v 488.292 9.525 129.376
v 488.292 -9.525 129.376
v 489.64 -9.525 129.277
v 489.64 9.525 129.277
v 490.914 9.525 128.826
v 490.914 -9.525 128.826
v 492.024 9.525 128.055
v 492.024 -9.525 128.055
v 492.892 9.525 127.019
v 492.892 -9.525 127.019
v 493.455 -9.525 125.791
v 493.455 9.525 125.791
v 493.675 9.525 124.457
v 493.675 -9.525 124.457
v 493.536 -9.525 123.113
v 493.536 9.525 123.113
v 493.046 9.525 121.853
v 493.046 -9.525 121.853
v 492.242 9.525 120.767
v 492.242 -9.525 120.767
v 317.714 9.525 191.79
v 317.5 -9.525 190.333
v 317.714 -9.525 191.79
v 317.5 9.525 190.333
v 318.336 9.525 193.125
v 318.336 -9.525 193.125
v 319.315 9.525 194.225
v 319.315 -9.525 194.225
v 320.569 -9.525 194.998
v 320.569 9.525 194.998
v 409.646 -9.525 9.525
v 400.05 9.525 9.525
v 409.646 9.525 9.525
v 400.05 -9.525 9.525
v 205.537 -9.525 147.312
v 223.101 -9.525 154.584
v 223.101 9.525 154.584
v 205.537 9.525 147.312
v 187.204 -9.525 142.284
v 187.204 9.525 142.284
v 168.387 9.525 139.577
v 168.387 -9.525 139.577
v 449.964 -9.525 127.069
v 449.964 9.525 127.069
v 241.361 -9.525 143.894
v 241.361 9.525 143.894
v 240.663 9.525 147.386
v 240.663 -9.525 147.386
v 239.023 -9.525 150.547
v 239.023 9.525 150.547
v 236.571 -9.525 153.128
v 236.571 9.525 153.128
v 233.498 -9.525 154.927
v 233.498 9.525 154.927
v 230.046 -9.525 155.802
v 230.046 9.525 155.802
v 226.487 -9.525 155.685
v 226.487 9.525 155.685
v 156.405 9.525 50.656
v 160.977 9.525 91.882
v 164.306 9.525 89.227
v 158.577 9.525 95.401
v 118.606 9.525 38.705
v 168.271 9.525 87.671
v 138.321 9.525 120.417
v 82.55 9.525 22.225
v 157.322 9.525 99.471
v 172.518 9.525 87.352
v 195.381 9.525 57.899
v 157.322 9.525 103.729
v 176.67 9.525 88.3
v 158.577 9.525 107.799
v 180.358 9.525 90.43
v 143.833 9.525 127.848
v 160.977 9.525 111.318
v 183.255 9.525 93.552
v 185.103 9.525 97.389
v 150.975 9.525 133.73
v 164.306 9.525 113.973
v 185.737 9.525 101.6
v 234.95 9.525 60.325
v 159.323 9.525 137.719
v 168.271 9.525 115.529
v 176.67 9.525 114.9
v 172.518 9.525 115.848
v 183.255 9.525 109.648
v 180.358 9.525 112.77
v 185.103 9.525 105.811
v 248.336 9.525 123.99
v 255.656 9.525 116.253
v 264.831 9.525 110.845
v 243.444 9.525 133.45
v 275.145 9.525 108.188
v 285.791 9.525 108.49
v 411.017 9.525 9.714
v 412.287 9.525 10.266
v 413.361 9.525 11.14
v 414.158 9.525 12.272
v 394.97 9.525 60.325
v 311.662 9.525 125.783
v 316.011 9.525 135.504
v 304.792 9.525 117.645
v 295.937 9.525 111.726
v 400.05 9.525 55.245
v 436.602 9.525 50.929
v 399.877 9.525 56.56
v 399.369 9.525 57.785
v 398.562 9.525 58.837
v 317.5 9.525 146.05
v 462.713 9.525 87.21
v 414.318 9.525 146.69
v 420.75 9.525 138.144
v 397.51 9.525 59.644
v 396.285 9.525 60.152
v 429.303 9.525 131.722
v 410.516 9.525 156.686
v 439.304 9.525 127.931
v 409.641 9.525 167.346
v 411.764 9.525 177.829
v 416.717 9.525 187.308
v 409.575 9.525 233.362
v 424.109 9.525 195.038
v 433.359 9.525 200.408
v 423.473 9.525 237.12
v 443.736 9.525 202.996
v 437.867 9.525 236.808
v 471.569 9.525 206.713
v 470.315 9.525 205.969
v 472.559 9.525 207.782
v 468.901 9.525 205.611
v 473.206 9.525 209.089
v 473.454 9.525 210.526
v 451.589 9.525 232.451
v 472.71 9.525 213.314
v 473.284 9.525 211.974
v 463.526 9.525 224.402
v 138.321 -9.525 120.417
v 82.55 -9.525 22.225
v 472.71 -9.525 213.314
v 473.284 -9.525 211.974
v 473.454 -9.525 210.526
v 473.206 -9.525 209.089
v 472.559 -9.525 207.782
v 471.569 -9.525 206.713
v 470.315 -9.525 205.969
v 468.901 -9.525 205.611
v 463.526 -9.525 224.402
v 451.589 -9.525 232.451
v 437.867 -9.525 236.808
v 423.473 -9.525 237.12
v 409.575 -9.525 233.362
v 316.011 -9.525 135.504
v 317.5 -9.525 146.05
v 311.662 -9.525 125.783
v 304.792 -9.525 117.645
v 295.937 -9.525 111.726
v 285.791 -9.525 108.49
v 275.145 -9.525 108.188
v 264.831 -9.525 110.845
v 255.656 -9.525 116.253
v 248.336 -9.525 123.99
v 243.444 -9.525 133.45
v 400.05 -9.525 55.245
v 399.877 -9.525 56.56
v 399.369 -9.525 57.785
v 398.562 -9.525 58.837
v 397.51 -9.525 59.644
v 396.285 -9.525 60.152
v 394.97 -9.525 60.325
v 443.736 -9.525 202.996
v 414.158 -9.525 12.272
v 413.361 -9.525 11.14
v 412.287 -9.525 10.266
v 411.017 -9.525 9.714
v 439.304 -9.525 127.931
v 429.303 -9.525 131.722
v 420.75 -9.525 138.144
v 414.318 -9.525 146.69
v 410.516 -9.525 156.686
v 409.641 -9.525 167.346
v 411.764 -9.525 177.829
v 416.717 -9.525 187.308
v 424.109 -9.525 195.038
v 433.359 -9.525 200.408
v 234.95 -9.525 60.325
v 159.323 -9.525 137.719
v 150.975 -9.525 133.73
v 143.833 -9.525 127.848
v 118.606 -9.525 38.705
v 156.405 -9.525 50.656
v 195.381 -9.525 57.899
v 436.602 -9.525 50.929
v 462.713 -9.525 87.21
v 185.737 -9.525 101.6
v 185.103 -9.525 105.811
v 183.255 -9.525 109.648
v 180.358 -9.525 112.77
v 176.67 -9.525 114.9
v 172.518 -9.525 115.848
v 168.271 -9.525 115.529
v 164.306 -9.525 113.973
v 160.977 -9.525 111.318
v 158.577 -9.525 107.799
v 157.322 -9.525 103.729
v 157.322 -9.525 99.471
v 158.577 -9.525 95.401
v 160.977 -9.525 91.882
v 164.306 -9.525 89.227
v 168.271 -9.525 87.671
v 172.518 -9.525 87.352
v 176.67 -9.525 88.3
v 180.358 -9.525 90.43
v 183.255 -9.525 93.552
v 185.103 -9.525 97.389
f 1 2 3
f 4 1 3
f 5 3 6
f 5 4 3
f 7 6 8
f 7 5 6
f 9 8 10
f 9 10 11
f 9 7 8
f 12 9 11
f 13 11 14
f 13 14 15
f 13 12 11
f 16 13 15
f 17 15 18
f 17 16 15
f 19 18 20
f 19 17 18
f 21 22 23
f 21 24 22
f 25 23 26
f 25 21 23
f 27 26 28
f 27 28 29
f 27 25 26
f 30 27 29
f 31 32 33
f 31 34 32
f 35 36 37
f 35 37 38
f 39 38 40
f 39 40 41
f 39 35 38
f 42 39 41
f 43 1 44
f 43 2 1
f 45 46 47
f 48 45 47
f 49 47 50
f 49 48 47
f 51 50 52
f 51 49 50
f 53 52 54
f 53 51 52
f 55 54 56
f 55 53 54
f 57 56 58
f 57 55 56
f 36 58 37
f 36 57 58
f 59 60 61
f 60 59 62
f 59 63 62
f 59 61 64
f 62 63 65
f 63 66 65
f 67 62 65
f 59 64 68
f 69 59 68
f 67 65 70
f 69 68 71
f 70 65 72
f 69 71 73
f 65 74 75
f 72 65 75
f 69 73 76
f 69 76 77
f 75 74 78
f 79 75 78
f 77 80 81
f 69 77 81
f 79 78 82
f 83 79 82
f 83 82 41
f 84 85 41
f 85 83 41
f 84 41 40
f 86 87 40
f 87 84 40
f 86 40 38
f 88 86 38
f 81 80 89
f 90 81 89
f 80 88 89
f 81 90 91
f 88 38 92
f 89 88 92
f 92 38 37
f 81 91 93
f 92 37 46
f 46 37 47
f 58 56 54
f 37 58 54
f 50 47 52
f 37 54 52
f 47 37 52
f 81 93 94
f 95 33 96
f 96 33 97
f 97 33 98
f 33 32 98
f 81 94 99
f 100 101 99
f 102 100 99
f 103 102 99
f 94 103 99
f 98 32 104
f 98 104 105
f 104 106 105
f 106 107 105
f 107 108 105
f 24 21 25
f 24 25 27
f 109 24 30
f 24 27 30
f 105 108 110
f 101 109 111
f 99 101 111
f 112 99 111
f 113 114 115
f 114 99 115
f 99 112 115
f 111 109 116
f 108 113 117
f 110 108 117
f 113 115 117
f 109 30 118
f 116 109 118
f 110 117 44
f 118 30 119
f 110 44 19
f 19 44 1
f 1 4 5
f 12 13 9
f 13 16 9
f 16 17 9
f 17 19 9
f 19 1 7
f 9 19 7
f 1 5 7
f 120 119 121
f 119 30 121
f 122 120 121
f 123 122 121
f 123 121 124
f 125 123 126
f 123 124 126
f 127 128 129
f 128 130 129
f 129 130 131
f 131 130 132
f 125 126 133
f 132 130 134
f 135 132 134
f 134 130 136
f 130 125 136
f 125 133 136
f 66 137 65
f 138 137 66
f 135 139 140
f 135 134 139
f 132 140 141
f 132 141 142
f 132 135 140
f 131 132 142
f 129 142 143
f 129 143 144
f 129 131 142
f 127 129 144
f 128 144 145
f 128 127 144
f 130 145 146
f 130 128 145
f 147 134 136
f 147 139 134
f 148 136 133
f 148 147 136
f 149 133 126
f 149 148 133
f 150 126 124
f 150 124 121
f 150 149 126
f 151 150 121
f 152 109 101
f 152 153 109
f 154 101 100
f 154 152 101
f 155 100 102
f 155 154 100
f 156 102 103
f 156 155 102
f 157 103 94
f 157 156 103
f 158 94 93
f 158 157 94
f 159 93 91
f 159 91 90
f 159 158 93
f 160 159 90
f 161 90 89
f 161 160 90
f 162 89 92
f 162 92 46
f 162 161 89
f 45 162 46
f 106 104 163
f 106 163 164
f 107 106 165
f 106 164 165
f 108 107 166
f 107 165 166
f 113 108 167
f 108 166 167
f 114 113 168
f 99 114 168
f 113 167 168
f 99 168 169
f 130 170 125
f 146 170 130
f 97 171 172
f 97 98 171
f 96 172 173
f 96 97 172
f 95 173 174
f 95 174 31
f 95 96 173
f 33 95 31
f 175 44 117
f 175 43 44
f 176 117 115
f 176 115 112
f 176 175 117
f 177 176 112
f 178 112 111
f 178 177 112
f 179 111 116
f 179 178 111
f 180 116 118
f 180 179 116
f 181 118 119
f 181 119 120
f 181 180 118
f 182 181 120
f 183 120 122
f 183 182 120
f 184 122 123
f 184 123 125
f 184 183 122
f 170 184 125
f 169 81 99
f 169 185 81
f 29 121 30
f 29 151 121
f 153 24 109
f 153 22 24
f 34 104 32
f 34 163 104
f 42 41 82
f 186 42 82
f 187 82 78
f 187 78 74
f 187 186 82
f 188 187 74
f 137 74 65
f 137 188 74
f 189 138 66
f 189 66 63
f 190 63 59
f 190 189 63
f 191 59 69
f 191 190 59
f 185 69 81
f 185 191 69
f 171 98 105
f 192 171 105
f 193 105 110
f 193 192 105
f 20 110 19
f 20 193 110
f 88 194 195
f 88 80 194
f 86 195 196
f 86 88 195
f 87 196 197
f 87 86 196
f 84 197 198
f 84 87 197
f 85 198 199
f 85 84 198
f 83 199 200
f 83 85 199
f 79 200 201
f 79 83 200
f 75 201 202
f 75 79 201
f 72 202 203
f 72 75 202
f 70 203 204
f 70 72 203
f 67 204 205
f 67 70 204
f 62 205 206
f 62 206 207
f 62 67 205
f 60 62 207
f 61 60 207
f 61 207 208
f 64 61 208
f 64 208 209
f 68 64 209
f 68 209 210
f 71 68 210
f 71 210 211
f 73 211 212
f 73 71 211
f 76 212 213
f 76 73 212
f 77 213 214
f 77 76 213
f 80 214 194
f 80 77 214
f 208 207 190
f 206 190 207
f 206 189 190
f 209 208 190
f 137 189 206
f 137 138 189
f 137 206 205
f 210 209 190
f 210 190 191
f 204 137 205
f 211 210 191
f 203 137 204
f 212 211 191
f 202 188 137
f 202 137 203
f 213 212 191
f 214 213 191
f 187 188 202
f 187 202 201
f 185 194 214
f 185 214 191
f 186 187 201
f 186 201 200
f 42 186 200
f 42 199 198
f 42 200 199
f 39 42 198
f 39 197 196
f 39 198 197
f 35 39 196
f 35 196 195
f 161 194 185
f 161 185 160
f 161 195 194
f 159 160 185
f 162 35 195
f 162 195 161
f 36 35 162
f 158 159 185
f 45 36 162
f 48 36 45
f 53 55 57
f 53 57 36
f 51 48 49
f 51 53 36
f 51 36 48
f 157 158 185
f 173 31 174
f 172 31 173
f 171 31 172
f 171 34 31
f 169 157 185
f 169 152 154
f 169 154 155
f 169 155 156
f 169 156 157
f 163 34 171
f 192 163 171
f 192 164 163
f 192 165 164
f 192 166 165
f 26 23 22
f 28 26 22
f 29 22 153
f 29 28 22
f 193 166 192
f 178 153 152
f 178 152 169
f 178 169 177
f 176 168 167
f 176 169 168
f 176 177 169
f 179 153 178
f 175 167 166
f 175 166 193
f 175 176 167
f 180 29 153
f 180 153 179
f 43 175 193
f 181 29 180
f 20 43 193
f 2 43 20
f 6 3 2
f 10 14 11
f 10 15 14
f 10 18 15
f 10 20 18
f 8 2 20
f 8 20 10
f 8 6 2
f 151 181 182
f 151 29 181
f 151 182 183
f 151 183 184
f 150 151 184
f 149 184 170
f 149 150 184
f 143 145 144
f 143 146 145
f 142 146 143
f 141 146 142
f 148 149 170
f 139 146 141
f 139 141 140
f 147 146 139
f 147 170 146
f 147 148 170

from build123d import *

# Parameters (mm, degrees)
F0_R     = 14.2875
F1_DEPTH = 9.525
F2_R     = 5.08


with BuildPart() as f1:
    # F0 (on Front) → F1 (new body, symmetric)
    with BuildSketch(Plane.XZ):
        with BuildLine():
            ThreePointArc((317.5, 146.05), (280.478203, 107.965259), (241.361025, 143.894458))
            ThreePointArc((241.361025, 143.894458), (235.097549, 154.13599), (223.100917, 154.584212))
            ThreePointArc((223.100917, 154.584212), (196.448532, 144.511932), (168.387104, 139.576686))
            ThreePointArc((168.387104, 139.576686), (150.974575, 133.730468), (138.320821, 120.416681))
            Line((138.320821, 120.416681), (82.55, 22.225))
            ThreePointArc((82.55, 22.225), (156.404838, 50.655649), (234.95, 60.325))
            Line((234.95, 60.325), (400.05, 60.325))
            Line((400.05, 60.325), (400.05, 9.525))
            Line((400.05, 9.525), (412.75, 9.525))
            ThreePointArc((412.75, 9.525), (452.222526, 73.519998), (501.65, 130.18008))
            Line((501.65, 130.18008), (449.9643, 127.06884))
            ThreePointArc((449.9643, 127.06884), (409.702523, 161.985365), (443.736498, 202.995886))
            Line((443.736498, 202.995886), (476.25, 206.375))
            ThreePointArc((476.25, 206.375), (448.550685, 233.798385), (409.575, 233.3625))
            Line((409.575, 233.3625), (317.5, 193.675))
            Line((317.5, 193.675), (317.5, 146.05))
        make_face()
        with Locations((171.45, 101.6)):
            Circle(F0_R, mode=Mode.SUBTRACT)
    extrude(amount=F1_DEPTH, both=True)

    # F2
    f2_edges = [f1.edges().sort_by_distance(p)[0] for p in [
        (317.5, 0, 193.675),
        (476.25, 0, 206.375),
        (501.65, 0, 130.18008),
        (412.75, 0, 9.525),
        (400.05, 0, 60.325),
    ]]
    fillet(f2_edges, radius=F2_R)


solid = f1.part
